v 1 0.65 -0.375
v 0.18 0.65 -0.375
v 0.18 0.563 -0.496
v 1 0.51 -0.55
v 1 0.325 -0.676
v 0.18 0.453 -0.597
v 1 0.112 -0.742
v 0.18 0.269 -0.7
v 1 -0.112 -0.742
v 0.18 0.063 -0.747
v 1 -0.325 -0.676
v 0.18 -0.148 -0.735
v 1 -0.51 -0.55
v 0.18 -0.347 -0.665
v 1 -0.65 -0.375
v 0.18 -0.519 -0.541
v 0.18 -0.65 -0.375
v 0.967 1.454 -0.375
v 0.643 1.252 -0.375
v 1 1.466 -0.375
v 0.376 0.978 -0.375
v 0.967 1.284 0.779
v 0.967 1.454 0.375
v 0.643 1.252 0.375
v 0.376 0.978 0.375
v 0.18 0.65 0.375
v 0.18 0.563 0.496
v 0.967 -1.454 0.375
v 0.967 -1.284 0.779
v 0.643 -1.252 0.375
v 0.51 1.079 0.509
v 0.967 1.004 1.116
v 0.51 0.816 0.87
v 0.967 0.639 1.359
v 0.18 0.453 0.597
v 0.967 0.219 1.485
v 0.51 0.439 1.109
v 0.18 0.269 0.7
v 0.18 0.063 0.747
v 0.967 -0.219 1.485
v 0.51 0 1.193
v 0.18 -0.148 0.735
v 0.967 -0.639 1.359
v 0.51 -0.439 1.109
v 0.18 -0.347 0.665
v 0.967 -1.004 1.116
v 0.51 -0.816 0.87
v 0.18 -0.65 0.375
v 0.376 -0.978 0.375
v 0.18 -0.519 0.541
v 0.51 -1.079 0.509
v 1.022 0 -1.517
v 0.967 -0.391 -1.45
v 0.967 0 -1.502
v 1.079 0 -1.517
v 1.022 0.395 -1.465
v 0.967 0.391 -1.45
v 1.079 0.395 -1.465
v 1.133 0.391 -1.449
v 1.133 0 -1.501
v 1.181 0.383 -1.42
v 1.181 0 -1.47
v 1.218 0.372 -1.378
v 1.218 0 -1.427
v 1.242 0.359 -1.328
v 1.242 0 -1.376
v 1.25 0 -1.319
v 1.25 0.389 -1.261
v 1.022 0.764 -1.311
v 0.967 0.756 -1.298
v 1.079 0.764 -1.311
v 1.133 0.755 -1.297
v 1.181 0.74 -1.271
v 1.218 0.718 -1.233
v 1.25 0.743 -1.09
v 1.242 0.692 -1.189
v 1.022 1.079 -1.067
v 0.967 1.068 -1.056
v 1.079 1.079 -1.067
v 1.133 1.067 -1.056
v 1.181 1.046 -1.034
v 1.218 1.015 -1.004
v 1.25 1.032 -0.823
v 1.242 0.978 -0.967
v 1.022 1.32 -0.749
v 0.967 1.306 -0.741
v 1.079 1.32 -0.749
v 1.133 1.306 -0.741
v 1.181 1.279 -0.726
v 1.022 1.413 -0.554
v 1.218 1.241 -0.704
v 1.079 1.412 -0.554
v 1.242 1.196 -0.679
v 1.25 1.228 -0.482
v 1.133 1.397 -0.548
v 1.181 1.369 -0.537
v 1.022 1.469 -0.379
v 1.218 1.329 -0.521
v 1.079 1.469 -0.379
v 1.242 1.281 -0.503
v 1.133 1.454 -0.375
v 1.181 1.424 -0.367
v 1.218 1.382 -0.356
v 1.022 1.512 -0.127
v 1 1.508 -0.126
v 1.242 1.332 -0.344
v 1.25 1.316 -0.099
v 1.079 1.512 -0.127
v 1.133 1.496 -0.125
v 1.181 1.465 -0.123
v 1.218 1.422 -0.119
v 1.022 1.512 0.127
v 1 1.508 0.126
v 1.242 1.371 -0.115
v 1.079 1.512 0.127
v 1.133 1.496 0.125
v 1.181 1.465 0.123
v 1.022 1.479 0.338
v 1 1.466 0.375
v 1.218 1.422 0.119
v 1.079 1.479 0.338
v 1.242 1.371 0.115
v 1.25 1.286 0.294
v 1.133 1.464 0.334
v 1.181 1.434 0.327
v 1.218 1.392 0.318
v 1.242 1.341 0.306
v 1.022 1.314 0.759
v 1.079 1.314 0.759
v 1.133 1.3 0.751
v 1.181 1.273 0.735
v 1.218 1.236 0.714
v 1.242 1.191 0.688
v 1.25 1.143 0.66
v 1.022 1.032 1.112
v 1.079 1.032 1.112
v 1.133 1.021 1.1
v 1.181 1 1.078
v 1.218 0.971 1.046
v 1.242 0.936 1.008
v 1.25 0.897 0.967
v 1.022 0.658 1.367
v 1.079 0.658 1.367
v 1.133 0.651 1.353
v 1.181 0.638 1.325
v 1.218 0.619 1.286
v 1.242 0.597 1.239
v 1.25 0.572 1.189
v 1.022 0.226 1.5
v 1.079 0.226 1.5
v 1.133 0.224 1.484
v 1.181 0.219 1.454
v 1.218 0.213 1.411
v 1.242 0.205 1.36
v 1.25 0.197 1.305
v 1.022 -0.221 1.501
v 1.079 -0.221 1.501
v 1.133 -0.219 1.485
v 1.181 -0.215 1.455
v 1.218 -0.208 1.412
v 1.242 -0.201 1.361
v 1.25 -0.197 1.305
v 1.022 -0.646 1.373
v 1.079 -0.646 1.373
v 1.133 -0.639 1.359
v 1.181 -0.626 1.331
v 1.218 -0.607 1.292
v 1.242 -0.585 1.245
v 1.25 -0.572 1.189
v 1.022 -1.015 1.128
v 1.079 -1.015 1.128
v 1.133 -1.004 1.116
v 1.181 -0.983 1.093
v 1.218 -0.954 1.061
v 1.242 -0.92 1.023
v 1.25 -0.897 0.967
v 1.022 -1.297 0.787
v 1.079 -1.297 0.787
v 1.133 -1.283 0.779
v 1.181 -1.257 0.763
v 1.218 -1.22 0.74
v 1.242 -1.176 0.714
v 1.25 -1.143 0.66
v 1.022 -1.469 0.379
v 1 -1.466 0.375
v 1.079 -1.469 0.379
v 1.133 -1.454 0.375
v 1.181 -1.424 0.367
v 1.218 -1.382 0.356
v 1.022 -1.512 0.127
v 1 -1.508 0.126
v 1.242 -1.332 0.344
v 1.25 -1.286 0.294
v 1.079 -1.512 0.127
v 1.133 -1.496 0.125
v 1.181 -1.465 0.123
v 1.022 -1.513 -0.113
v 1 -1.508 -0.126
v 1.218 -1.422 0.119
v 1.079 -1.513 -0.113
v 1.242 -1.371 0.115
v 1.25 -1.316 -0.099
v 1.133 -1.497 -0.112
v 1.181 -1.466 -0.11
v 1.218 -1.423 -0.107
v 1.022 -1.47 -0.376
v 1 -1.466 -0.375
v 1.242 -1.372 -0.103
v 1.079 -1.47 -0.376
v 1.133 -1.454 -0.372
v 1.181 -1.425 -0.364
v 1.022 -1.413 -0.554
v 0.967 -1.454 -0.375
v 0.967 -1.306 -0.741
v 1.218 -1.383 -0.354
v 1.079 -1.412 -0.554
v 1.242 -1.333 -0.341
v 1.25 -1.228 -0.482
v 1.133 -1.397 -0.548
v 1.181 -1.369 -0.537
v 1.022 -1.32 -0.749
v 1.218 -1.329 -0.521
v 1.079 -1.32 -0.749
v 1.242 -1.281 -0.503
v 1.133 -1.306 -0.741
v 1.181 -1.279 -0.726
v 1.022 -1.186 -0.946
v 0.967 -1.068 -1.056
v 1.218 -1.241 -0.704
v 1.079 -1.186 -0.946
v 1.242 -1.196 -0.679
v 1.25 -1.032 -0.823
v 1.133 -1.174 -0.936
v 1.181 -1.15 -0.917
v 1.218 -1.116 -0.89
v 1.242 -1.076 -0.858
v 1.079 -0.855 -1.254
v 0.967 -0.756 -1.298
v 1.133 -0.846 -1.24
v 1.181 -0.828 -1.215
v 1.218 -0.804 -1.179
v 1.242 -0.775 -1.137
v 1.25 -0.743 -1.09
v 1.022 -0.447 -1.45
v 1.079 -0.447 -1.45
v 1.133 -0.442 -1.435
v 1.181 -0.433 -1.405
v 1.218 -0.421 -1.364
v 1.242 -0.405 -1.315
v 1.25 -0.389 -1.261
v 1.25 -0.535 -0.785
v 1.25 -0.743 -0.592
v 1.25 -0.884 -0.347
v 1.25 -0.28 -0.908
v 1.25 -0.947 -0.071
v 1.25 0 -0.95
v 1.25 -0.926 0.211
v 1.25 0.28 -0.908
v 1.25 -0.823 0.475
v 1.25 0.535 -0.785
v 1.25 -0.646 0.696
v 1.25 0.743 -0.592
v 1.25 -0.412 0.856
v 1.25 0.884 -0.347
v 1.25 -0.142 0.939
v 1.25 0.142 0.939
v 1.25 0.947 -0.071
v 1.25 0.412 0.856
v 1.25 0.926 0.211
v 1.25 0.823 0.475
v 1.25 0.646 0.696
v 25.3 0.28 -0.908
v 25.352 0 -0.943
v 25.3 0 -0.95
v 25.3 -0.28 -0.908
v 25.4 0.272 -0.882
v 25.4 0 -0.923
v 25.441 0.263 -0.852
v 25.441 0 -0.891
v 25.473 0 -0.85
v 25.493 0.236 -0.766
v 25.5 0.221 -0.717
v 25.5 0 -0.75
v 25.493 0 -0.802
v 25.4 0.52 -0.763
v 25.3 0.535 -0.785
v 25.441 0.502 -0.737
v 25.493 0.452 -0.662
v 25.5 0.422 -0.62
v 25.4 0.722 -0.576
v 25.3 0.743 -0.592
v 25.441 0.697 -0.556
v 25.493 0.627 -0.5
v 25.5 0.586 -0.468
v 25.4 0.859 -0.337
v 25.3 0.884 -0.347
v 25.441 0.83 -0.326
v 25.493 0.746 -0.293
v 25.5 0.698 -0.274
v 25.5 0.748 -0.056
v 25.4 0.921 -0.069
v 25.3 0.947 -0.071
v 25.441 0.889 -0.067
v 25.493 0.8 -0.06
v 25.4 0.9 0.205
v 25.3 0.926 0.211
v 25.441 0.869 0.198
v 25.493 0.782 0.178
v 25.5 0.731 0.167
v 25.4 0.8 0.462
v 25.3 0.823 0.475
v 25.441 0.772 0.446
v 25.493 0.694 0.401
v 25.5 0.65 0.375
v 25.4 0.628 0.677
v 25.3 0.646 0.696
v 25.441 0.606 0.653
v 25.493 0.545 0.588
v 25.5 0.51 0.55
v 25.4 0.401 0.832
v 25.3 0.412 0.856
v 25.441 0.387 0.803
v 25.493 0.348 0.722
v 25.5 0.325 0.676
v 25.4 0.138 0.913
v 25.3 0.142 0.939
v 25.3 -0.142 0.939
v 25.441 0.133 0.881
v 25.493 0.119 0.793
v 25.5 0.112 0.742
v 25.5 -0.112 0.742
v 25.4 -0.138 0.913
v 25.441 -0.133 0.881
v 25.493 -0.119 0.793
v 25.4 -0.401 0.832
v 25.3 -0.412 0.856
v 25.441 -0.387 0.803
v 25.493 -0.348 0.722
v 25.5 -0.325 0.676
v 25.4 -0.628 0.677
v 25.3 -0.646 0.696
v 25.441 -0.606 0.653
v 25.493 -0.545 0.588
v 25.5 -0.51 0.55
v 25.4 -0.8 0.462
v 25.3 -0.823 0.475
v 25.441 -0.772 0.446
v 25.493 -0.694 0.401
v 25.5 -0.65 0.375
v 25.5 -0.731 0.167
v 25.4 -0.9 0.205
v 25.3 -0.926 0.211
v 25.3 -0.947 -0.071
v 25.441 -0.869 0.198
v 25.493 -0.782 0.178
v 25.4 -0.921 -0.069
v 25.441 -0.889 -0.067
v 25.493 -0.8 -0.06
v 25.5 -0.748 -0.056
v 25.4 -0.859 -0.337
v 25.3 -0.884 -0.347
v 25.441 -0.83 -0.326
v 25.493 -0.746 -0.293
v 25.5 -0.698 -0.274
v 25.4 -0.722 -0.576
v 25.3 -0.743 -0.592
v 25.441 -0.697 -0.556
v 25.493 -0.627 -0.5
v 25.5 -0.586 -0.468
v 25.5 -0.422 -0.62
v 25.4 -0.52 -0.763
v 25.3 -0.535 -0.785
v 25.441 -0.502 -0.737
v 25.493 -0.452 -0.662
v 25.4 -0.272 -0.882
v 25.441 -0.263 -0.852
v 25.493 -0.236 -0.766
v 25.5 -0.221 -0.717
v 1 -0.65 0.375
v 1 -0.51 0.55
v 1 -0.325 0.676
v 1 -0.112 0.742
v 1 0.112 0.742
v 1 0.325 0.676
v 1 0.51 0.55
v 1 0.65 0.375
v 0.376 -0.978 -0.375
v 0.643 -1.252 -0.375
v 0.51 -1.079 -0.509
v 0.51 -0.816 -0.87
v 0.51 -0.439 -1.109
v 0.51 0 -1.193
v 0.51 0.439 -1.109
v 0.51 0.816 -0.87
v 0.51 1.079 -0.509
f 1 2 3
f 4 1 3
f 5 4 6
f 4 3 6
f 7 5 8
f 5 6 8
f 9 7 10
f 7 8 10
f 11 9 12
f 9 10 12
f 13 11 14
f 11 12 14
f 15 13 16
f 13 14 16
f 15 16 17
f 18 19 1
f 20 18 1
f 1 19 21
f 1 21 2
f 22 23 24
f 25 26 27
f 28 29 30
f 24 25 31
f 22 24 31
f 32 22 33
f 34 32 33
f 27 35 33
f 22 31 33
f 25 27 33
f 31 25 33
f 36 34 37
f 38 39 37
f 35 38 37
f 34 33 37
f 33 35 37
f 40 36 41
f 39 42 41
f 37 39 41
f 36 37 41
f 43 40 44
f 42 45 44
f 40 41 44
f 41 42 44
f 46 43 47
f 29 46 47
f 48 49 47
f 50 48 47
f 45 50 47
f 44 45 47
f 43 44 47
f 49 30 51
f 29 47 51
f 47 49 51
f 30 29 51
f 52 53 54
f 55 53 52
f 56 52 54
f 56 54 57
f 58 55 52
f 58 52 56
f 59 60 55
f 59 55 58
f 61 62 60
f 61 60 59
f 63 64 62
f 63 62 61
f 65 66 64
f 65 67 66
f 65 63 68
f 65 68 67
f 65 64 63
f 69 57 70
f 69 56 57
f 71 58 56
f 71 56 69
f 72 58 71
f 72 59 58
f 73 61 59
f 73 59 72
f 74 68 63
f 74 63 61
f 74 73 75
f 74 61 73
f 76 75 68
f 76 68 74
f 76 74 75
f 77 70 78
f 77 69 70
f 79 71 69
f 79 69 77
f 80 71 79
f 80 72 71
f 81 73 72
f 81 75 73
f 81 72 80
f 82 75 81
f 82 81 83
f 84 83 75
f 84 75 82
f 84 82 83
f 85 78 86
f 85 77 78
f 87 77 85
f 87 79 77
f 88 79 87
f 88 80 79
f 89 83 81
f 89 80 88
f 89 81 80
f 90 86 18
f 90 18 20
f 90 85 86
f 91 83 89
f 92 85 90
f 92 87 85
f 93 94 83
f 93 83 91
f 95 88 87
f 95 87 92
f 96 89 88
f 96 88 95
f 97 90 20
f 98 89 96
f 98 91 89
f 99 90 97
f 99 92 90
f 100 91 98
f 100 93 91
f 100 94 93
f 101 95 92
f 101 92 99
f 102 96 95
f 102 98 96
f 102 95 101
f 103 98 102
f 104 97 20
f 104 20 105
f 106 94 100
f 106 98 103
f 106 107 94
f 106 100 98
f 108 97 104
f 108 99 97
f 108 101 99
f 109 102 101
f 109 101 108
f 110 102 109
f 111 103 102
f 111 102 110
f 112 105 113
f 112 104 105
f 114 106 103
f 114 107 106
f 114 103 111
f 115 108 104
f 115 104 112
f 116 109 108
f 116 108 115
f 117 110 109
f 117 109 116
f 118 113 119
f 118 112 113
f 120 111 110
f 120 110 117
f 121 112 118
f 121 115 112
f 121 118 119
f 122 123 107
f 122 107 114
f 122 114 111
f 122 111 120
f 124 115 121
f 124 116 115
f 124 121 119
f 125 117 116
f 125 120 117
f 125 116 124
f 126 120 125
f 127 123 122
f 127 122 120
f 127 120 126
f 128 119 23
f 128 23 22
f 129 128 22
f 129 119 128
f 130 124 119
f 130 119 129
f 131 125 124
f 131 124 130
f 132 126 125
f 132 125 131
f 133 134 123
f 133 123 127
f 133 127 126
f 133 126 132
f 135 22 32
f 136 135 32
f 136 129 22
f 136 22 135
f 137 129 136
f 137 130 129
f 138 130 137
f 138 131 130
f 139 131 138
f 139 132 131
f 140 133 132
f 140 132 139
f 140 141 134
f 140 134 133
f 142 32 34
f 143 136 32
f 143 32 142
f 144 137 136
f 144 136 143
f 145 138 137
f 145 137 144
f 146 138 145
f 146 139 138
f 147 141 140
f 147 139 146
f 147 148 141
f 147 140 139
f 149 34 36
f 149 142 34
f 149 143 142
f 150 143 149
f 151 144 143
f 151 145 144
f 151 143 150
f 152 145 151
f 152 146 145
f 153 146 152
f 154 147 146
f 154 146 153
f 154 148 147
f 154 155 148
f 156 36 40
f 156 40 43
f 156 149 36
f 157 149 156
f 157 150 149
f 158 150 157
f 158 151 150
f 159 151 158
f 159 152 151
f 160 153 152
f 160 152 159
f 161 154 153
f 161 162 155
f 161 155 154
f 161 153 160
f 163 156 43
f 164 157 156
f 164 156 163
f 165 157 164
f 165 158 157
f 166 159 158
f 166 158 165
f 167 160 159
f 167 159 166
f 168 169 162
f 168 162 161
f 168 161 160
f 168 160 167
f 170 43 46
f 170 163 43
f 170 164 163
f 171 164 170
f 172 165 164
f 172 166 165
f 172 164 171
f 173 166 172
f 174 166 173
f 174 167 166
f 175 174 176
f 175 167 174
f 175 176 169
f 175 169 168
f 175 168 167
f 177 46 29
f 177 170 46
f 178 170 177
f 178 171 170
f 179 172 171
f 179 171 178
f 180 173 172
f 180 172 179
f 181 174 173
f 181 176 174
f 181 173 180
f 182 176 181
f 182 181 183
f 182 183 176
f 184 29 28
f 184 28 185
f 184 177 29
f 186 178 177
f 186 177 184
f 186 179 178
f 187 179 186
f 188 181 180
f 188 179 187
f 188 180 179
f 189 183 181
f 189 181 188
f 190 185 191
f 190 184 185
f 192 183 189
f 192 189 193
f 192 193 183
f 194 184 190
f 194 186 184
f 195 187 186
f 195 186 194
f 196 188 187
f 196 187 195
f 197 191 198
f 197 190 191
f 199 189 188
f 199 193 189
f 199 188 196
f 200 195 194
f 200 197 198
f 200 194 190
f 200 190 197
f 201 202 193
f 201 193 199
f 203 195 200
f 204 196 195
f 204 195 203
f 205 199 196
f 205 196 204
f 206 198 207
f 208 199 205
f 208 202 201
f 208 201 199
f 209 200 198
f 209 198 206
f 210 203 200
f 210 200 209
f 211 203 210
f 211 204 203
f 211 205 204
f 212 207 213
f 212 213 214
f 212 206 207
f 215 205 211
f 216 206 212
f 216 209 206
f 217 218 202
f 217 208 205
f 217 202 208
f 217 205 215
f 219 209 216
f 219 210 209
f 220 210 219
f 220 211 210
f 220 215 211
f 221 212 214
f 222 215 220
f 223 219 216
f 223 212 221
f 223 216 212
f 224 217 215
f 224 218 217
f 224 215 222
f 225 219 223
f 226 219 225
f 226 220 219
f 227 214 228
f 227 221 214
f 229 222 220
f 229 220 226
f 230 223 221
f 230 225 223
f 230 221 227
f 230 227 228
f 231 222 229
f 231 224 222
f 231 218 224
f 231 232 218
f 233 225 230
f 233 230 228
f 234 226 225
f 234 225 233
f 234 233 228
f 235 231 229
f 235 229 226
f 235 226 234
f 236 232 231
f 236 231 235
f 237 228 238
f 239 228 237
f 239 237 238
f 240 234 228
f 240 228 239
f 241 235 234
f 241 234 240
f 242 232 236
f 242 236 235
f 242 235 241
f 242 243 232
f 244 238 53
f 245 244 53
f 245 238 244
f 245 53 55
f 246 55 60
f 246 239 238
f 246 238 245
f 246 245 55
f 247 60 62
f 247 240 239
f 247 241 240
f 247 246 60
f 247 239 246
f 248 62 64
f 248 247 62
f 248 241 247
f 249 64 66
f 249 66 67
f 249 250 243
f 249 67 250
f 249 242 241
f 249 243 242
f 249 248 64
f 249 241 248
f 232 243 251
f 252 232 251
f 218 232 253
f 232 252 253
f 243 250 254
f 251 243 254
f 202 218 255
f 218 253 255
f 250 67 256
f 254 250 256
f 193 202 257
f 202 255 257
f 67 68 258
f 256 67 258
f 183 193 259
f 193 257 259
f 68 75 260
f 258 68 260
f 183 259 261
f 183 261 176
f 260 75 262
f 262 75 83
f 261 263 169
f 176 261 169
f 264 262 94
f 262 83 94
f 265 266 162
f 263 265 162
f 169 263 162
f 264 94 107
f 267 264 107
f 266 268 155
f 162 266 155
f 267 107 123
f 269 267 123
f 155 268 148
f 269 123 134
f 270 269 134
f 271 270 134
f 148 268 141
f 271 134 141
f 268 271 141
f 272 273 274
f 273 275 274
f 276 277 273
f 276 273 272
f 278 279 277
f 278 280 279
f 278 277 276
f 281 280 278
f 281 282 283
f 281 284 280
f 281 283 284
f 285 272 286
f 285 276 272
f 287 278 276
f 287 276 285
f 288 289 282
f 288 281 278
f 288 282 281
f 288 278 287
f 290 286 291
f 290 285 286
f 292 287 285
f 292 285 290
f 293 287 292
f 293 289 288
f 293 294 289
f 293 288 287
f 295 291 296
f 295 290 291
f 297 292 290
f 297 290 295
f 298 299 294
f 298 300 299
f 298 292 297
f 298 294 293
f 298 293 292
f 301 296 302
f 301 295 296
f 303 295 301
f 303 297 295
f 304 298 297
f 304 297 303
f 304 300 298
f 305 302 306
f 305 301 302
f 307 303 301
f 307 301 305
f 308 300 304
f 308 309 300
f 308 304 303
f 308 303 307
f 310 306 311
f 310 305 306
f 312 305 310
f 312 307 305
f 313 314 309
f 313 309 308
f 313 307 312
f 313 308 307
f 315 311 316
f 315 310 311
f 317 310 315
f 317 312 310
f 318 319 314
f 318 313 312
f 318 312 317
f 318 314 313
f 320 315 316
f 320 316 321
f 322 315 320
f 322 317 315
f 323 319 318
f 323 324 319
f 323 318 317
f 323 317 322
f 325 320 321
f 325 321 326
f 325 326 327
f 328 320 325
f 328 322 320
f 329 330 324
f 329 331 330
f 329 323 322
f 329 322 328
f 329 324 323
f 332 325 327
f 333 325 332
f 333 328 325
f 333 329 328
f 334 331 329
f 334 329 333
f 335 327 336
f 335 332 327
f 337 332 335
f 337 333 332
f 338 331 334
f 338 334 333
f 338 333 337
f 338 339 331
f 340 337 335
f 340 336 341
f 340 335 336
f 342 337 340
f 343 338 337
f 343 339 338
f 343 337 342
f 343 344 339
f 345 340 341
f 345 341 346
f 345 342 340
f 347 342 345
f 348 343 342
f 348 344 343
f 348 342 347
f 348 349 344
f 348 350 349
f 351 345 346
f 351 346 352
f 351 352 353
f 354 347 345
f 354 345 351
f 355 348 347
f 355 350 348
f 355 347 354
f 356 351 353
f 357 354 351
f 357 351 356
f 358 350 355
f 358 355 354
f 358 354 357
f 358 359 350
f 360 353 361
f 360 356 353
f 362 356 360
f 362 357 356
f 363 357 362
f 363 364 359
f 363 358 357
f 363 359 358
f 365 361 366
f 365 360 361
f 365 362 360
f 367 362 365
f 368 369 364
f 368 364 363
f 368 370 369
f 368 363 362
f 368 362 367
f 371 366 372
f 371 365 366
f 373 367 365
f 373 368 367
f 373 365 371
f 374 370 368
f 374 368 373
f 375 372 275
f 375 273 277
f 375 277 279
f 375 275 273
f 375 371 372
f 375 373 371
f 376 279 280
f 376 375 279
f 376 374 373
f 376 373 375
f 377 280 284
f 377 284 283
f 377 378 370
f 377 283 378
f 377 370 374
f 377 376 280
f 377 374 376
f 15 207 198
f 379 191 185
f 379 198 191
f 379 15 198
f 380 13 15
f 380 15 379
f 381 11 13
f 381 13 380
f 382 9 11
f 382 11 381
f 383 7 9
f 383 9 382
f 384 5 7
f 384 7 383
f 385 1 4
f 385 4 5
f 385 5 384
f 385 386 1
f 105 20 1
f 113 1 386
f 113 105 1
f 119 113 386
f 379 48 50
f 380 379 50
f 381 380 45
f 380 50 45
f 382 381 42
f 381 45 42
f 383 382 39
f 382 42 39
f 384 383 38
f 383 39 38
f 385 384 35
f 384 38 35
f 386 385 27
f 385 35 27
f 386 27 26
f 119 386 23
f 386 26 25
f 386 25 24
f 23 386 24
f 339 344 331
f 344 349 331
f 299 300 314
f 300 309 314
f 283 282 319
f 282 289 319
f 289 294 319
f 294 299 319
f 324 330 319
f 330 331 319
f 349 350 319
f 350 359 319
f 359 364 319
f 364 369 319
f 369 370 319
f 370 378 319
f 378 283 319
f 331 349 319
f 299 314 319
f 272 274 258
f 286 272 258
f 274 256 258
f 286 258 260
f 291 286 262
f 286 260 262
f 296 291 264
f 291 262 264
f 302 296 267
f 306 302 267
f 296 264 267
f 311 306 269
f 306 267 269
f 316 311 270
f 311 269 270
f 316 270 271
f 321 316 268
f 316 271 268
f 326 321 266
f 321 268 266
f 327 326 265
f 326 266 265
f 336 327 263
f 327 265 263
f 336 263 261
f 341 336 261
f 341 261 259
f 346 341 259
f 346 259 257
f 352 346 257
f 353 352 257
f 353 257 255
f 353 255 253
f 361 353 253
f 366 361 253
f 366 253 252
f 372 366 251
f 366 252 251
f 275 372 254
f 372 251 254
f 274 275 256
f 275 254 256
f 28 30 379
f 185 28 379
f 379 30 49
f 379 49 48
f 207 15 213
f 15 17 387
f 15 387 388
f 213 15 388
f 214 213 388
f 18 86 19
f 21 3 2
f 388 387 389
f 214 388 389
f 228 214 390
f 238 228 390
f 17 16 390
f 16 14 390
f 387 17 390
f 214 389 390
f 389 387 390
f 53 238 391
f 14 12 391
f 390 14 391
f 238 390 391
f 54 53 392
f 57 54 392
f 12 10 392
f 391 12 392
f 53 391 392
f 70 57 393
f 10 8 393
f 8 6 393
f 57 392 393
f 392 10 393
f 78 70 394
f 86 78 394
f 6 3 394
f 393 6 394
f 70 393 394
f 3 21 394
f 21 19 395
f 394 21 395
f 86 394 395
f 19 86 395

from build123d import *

# Parameters (mm, degrees)
CUT_EXTRUDE1_DEPTH = 1
FILLET1_R          = 0.2


with BuildPart() as part:
    # Sketch1 → Revolve1 (revolve)
    with BuildSketch(Plane(origin=(0, 0, 0), x_dir=(1, 0, 0), z_dir=(0, 1, 0))):
        with BuildLine():
            Line((0, 0), (25.5, 0))
            Line((25.5, 0), (25.5, 0.95))
            Line((25.5, 0.95), (1.25, 0.95))
            Line((1.25, 0.95), (1.25, 1.6))
            ThreePointArc((1.25, 1.6), (0.349547808, 1.015197025), (0, 0))
        make_face()
    revolve(axis=Axis((0, 0, 0), (1, 0, 0)))

    # Sketch2 → Cut-Extrude1 (cut)
    with BuildSketch(Plane(origin=(0, 0, 0), x_dir=(0, 0, -1), z_dir=(1, 0, 0))):
        with BuildLine():
            Line((0.375, -1.925921717), (-0.375, -1.925921717))
            Line((-0.375, -1.925921717), (-0.375, -0.649519053))
            ThreePointArc((-0.375, -0.649519053), (-0.75, 0), (-0.375, 0.649519053))
            Line((-0.375, 0.649519053), (-0.375, 1.925921717))
            Line((-0.375, 1.925921717), (0.375, 1.925921717))
            Line((0.375, 1.925921717), (0.375, 0.649519053))
            ThreePointArc((0.375, 0.649519053), (0.75, 0), (0.375, -0.649519053))
            Line((0.375, -0.649519053), (0.375, -1.925921717))
        make_face()
    extrude(amount=CUT_EXTRUDE1_DEPTH, mode=Mode.SUBTRACT)

    # Fillet1
    # the kernel refuses this fillet: 0.2 mm, written as the material it takes off along each edge
    with BuildSketch(Plane(origin=(25.5, 0, 0), x_dir=(0, 0, -1), z_dir=(0, -1, 0))) as fillet1_piece_1:
        with BuildLine():
            CenterArc((0.95 - FILLET1_R, -FILLET1_R), FILLET1_R, 0, 90)
            Line((0.95, -FILLET1_R), (0.95, 0))
            Line((0.95, 0), (0.95 - FILLET1_R, 0))
        make_face()
    revolve(axis=Axis((25.5, 0, 0), (1, 0, 0)), mode=Mode.SUBTRACT)
    with BuildSketch(Plane(origin=(1.25, 0, 0), x_dir=(0, 0, -1), z_dir=(0, -1, 0))) as fillet1_piece_2:
        with BuildLine():
            CenterArc((1.3193938, -0.2), FILLET1_R, 335.582123666, 114.417876334)
            ThreePointArc((1.501504746, -0.282677709), (1.557180013, -0.143578479), (1.6, 0))
            Line((1.6, 0), (1.3193938, 0))
        make_face()
    revolve(axis=Axis((1.25, 0, 0), (1, 0, 0)), mode=Mode.SUBTRACT)


solid = part.part
